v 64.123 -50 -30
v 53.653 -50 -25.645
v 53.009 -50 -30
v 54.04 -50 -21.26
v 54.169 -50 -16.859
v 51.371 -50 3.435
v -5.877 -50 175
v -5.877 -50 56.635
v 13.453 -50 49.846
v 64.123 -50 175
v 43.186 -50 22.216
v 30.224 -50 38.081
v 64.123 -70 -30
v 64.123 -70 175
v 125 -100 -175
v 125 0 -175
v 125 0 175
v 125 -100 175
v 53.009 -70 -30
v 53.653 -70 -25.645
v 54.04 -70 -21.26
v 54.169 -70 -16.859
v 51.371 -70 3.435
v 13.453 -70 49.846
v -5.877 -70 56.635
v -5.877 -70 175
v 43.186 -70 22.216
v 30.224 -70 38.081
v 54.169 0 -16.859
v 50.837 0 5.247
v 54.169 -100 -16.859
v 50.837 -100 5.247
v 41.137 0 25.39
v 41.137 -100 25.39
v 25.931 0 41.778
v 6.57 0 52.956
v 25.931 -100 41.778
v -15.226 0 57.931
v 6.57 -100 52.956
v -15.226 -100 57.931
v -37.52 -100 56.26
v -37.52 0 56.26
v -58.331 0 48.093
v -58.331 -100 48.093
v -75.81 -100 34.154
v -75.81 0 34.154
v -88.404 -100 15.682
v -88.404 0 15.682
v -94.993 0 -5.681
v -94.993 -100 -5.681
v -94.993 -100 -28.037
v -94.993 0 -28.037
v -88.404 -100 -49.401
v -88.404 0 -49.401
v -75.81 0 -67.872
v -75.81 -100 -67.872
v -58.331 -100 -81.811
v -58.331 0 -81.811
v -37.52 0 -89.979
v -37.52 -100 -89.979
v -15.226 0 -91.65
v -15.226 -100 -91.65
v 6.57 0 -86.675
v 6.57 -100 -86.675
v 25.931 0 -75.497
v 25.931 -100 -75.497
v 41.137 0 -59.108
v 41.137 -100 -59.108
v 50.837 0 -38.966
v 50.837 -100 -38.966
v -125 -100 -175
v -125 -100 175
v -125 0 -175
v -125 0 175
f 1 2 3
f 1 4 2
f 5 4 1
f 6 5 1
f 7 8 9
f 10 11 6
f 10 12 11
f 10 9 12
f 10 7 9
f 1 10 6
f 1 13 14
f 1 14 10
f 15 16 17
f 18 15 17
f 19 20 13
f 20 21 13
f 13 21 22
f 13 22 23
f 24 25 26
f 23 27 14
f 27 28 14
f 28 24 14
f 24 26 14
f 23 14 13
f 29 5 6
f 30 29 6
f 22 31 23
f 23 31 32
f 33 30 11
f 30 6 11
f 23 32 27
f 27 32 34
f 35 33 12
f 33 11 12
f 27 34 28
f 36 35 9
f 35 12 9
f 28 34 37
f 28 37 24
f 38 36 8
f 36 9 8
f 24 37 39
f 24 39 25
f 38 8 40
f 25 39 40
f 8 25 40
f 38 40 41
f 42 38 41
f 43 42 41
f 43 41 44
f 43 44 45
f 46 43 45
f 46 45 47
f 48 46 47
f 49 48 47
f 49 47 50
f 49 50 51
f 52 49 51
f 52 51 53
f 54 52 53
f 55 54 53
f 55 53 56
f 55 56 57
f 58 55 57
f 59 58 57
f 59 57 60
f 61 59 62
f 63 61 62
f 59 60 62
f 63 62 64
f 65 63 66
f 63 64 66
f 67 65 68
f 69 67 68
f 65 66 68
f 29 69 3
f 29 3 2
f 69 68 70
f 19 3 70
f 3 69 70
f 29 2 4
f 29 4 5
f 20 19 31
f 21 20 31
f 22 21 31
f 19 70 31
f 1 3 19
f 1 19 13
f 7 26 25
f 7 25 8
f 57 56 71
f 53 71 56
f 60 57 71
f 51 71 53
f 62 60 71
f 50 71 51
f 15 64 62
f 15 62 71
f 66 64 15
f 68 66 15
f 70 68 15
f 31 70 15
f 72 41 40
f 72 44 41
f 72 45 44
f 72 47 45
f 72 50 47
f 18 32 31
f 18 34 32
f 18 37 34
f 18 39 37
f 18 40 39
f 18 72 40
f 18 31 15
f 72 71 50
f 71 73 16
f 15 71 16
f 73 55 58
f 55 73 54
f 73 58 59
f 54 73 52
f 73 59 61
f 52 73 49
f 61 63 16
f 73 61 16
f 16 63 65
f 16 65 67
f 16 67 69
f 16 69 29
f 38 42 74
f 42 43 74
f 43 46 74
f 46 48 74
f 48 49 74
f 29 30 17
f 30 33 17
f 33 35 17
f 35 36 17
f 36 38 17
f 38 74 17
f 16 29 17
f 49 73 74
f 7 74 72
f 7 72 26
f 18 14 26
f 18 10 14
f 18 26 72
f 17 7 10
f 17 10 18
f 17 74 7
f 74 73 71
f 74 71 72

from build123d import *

# Parameters (mm, degrees)
F0_W     = 250
F0_H     = 350
F1_DEPTH = 100
F2_R     = 75
F3_DEPTH = 267
F4_W     = 70
F4_H     = 20
F5_DEPTH = 205


with BuildPart() as f1:
    # F0 (on Front) → F1 (new body)
    with BuildSketch(Plane.XZ):
        Rectangle(F0_W, F0_H)
    extrude(amount=F1_DEPTH)

    # F2 (on face) → F3 (cut)
    with BuildSketch(Plane.XZ.offset(100)):
        with Locations((-20.83086, -16.859313)):
            Circle(F2_R)
    extrude(amount=-F3_DEPTH, mode=Mode.SUBTRACT)

    # F4 (on face) → F5 (cut)
    with BuildSketch(Plane.XY.offset(175)):
        with Locations((29.123203, -60)):
            Rectangle(F4_W, F4_H)
    extrude(amount=-F5_DEPTH, mode=Mode.SUBTRACT)


solid = f1.part
